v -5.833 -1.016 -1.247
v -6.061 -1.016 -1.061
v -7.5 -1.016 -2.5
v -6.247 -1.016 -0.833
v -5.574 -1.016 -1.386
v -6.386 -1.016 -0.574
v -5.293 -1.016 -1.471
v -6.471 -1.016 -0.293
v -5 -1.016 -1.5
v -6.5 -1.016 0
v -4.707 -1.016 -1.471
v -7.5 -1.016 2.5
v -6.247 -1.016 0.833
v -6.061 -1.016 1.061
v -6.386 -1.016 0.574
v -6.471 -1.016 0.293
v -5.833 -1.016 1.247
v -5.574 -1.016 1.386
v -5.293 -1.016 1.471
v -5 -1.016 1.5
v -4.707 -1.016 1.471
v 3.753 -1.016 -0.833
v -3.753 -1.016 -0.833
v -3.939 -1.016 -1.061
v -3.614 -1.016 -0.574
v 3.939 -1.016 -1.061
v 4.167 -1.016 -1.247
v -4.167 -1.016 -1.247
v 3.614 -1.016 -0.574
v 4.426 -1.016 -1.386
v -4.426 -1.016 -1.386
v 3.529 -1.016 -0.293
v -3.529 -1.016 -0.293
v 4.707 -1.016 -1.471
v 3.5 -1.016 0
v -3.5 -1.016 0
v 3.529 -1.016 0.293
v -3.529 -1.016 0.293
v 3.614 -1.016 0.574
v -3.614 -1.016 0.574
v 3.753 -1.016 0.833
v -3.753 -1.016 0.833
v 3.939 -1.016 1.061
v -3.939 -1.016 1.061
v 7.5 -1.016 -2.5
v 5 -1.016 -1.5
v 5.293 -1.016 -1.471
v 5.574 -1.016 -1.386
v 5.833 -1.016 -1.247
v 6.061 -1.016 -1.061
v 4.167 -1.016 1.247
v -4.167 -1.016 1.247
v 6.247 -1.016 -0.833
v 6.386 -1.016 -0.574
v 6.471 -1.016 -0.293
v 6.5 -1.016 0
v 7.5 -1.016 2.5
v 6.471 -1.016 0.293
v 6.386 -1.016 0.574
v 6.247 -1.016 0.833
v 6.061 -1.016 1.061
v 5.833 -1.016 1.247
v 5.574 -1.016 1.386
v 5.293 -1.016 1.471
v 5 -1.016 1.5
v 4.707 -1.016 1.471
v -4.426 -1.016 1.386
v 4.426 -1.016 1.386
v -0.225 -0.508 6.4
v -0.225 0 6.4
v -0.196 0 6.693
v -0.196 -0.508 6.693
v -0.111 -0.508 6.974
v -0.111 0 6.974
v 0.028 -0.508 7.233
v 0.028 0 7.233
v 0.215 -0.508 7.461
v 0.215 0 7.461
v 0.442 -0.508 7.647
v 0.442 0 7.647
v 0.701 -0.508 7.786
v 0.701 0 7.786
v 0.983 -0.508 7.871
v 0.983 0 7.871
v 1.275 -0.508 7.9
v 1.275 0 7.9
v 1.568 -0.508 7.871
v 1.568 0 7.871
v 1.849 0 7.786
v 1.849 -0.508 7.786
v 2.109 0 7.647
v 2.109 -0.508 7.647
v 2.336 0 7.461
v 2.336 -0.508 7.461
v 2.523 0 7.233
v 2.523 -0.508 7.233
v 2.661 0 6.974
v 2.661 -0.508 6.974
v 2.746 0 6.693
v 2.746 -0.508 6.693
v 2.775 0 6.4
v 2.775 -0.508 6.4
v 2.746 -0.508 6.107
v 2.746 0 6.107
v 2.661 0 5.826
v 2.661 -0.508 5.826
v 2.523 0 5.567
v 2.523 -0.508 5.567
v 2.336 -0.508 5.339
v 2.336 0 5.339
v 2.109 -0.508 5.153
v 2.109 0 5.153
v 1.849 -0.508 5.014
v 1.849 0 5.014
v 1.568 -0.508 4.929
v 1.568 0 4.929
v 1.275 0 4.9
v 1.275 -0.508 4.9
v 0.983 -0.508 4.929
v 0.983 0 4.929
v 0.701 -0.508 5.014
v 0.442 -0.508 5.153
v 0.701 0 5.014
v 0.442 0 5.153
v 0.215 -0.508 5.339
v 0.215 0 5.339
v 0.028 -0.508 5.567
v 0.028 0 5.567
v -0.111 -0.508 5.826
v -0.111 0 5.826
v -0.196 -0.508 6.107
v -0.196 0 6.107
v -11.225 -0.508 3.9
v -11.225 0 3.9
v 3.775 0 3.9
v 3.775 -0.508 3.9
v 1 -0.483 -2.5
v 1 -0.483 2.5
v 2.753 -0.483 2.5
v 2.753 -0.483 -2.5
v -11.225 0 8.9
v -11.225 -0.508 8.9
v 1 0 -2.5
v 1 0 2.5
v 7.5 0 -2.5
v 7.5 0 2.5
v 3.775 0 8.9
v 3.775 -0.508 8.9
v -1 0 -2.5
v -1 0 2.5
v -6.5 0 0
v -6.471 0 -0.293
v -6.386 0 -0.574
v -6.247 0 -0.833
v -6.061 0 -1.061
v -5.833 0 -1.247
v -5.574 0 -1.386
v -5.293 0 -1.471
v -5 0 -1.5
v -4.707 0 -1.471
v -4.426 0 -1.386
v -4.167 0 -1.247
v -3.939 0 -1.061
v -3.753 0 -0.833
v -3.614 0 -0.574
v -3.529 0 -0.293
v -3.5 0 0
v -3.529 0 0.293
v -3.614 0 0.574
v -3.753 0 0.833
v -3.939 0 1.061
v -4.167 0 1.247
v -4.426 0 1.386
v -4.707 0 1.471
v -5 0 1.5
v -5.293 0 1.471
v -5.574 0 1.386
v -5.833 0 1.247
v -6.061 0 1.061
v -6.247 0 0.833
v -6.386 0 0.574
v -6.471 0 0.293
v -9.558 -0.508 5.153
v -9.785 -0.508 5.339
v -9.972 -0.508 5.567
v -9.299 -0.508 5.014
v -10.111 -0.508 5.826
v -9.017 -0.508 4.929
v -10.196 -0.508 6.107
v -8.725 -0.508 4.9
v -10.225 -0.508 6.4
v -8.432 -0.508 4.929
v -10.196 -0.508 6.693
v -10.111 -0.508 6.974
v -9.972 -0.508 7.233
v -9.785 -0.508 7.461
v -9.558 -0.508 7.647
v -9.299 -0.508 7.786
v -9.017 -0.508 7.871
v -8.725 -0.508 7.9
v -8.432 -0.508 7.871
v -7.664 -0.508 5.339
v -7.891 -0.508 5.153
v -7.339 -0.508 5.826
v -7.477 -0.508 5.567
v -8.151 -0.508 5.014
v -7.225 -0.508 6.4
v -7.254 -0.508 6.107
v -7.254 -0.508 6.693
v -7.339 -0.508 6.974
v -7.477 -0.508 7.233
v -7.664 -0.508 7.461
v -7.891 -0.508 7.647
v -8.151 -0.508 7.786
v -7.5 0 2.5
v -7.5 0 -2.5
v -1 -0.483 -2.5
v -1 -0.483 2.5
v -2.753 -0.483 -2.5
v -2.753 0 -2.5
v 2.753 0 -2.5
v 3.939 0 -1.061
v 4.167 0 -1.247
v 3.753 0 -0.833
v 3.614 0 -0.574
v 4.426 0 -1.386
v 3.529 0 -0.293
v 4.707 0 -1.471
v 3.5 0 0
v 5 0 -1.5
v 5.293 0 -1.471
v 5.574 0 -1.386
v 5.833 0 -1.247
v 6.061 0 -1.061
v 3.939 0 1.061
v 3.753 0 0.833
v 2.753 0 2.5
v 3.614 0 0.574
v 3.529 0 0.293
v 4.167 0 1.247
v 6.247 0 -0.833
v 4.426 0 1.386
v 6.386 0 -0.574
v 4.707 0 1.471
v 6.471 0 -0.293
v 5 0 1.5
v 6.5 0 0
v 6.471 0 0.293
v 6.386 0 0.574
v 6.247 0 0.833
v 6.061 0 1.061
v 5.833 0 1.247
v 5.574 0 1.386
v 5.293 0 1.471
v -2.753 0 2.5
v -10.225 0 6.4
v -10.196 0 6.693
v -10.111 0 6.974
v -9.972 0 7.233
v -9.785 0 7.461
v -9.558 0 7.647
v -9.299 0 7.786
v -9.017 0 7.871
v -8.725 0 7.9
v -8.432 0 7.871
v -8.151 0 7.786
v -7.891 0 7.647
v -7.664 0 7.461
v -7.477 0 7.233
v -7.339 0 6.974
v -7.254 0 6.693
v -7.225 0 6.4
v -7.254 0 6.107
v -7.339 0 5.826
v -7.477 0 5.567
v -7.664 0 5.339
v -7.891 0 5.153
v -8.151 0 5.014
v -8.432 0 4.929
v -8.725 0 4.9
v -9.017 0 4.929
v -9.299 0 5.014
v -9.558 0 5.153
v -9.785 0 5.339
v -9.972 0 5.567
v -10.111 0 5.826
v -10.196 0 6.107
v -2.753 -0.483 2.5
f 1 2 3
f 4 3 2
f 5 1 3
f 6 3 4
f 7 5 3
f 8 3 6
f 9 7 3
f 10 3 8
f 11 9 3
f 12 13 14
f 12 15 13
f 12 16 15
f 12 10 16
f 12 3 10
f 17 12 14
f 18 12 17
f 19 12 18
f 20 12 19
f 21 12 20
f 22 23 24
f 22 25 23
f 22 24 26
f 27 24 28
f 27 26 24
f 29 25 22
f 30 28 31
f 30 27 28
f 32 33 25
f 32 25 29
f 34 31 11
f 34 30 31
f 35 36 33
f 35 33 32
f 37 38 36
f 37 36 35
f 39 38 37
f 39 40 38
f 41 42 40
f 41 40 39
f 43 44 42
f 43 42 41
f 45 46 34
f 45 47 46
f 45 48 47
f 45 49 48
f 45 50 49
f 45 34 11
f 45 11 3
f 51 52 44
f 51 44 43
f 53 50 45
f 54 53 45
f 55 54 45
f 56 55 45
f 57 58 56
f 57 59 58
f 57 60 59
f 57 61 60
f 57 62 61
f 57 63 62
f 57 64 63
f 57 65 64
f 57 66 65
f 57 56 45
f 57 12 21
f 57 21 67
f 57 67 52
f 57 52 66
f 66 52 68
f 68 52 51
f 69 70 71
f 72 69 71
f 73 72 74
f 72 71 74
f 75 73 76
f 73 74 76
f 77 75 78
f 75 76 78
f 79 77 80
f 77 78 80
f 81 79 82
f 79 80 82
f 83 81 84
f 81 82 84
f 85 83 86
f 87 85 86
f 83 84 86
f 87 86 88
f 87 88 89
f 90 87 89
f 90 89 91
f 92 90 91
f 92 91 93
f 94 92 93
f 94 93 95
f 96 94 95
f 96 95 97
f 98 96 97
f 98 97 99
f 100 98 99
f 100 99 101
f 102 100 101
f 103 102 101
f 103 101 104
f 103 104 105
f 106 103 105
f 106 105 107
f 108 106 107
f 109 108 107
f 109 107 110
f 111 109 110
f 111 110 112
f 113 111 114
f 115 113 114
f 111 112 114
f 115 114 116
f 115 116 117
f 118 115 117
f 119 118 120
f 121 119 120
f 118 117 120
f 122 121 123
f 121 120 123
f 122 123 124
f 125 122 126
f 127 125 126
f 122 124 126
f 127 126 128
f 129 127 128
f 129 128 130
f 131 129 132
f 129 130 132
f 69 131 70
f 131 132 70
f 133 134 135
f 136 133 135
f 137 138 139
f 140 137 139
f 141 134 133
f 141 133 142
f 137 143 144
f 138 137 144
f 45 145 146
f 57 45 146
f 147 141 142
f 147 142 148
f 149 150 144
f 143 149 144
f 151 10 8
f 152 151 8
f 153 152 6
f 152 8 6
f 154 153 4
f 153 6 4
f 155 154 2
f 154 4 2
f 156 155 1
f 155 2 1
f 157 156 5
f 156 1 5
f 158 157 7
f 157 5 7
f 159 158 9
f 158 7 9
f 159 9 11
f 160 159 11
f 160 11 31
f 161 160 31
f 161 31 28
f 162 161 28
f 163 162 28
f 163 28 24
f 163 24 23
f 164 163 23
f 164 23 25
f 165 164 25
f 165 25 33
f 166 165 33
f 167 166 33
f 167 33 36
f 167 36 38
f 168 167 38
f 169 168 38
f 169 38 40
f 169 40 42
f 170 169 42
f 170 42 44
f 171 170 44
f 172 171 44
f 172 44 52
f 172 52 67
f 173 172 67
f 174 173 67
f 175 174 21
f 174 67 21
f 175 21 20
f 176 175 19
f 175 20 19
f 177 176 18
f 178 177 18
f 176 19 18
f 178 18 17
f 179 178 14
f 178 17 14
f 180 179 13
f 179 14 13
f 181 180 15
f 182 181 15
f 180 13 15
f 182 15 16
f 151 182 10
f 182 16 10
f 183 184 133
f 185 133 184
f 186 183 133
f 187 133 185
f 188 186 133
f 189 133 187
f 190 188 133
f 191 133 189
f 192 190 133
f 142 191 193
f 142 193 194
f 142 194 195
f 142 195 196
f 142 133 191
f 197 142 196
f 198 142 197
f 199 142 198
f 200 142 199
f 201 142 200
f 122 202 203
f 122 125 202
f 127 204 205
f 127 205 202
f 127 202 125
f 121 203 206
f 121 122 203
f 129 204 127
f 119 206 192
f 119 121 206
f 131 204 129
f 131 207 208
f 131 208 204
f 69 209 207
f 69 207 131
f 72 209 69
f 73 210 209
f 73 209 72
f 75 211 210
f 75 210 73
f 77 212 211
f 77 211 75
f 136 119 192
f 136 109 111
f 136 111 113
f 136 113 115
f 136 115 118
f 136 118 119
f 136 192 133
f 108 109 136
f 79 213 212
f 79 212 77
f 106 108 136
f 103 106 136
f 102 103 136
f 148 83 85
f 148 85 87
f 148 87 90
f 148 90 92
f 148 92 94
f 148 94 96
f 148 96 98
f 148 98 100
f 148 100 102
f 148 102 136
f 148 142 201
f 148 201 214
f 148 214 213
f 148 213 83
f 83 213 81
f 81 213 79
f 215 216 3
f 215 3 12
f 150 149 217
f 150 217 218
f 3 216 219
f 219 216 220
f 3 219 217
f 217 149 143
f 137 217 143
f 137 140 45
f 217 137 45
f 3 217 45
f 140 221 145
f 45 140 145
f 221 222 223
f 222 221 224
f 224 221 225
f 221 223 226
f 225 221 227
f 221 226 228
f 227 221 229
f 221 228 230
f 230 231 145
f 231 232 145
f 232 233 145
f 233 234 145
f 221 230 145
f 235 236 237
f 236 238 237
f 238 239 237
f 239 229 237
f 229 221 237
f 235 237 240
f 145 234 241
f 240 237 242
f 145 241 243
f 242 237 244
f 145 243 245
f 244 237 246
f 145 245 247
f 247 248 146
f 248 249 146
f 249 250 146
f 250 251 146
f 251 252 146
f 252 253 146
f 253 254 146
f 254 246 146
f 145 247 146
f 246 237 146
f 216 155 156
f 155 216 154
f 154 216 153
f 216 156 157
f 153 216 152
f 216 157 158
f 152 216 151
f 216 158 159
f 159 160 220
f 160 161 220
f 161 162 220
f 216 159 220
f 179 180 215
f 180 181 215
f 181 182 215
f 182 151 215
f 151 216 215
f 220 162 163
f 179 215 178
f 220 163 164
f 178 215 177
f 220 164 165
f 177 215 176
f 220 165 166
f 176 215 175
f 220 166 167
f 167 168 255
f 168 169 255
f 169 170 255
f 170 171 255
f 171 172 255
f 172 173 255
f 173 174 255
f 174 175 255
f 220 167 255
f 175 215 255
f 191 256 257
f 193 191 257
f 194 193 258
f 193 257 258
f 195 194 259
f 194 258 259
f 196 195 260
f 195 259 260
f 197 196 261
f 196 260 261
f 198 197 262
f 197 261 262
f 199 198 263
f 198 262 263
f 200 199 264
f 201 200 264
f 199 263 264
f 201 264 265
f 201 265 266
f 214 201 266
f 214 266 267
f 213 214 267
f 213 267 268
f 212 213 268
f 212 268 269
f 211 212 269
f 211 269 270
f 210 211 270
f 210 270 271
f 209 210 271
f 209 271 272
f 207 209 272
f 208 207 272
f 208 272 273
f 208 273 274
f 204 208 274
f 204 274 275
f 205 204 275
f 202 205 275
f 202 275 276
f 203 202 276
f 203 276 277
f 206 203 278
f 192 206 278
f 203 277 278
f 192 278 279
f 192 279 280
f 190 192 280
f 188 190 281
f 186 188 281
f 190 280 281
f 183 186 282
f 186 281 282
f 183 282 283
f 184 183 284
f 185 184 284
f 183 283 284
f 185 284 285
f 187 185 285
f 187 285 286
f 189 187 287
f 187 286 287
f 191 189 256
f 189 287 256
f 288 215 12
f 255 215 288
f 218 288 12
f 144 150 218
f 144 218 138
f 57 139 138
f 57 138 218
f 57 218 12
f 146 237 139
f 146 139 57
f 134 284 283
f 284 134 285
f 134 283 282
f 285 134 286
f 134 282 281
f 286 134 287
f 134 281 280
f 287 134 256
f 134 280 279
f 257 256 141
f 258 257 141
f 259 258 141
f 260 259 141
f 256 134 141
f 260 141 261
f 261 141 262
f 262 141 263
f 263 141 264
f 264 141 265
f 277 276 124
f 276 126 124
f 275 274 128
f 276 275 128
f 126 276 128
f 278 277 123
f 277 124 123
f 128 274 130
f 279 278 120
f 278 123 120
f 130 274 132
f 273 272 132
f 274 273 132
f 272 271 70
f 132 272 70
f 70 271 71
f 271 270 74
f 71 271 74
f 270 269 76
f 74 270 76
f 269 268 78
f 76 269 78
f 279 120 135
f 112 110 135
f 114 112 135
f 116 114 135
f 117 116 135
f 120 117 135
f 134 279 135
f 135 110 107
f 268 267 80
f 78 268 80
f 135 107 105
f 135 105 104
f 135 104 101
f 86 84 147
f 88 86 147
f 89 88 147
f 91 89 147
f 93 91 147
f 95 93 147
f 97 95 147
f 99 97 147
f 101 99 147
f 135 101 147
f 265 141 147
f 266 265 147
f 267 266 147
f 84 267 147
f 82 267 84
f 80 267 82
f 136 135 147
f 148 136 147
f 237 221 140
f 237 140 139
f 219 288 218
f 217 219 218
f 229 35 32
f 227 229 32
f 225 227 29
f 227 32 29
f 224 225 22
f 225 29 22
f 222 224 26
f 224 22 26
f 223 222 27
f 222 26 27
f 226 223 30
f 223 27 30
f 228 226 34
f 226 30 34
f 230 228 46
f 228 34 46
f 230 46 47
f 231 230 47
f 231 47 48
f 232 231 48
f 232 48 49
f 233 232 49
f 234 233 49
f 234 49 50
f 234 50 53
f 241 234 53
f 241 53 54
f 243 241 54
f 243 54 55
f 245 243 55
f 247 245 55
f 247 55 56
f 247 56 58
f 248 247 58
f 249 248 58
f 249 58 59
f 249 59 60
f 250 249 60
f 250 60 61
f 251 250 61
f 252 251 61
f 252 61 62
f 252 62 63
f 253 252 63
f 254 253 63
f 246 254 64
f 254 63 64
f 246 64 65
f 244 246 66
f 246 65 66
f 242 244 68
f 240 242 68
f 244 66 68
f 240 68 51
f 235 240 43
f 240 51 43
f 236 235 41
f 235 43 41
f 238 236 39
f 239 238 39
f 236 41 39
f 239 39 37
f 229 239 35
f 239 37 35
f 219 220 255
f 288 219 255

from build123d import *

# Parameters (mm, degrees)
F0_W      = 15
F0_H      = 5
F1_DEPTH  = 1.016
F2_W      = 15
F2_H      = 5
F3_DEPTH  = 0.508
F4_W      = 1.7526
F4_H      = 6
F5_DEPTH  = 0.4826
F7_D      = 3
F9_W      = 1.7526
F9_H      = 6
F10_DEPTH = 0.4826
F12_D     = 3


with BuildPart() as f1:
    # F0 (on Front) → F1 (new body)
    with BuildSketch(Plane.XZ):
        Rectangle(F0_W, F0_H)
    extrude(amount=F1_DEPTH)

    # F7 (through all)
    with Locations(Plane(origin=(0, 0, 0), x_dir=(1, 0, 0), z_dir=(0, 1, 0))):
        with Locations((-5, 0), (5, 0)):
            Hole(F7_D / 2)


with BuildPart() as f3:
    # F2 (on Front) → F3 (new body)
    with BuildSketch(Plane.XZ):
        with Locations((-3.724698, 6.400033)):
            Rectangle(F2_W, F2_H)
    extrude(amount=F3_DEPTH)

    # F12 (through all)
    with Locations(Plane.XZ.offset(0.508)):
        with Locations((-8.724698, 6.400033), (1.275302, 6.400033)):
            Hole(F12_D / 2)


with BuildPart() as f5:
    # F4 (on Front) → F5 (new body)
    with BuildSketch(Plane.XZ):
        with Locations((-1.8763, 0)):
            Rectangle(F4_W, F4_H)
    extrude(amount=F5_DEPTH)


with BuildPart() as f1_1:
    add(f1.part)

    # F8: cut F5
    add(f5.part, mode=Mode.SUBTRACT)


with BuildPart() as f10:
    # F9 (on Front) → F10 (new body)
    with BuildSketch(Plane.XZ):
        with Locations((1.8763, 0)):
            Rectangle(F9_W, F9_H)
    extrude(amount=F10_DEPTH)


with BuildPart() as f1_2:
    add(f1_1.part)

    # F13: cut F5, F10
    add(f5.part, mode=Mode.SUBTRACT)
    add(f10.part, mode=Mode.SUBTRACT)


solid = Compound([f3.part, f1_2.part])
